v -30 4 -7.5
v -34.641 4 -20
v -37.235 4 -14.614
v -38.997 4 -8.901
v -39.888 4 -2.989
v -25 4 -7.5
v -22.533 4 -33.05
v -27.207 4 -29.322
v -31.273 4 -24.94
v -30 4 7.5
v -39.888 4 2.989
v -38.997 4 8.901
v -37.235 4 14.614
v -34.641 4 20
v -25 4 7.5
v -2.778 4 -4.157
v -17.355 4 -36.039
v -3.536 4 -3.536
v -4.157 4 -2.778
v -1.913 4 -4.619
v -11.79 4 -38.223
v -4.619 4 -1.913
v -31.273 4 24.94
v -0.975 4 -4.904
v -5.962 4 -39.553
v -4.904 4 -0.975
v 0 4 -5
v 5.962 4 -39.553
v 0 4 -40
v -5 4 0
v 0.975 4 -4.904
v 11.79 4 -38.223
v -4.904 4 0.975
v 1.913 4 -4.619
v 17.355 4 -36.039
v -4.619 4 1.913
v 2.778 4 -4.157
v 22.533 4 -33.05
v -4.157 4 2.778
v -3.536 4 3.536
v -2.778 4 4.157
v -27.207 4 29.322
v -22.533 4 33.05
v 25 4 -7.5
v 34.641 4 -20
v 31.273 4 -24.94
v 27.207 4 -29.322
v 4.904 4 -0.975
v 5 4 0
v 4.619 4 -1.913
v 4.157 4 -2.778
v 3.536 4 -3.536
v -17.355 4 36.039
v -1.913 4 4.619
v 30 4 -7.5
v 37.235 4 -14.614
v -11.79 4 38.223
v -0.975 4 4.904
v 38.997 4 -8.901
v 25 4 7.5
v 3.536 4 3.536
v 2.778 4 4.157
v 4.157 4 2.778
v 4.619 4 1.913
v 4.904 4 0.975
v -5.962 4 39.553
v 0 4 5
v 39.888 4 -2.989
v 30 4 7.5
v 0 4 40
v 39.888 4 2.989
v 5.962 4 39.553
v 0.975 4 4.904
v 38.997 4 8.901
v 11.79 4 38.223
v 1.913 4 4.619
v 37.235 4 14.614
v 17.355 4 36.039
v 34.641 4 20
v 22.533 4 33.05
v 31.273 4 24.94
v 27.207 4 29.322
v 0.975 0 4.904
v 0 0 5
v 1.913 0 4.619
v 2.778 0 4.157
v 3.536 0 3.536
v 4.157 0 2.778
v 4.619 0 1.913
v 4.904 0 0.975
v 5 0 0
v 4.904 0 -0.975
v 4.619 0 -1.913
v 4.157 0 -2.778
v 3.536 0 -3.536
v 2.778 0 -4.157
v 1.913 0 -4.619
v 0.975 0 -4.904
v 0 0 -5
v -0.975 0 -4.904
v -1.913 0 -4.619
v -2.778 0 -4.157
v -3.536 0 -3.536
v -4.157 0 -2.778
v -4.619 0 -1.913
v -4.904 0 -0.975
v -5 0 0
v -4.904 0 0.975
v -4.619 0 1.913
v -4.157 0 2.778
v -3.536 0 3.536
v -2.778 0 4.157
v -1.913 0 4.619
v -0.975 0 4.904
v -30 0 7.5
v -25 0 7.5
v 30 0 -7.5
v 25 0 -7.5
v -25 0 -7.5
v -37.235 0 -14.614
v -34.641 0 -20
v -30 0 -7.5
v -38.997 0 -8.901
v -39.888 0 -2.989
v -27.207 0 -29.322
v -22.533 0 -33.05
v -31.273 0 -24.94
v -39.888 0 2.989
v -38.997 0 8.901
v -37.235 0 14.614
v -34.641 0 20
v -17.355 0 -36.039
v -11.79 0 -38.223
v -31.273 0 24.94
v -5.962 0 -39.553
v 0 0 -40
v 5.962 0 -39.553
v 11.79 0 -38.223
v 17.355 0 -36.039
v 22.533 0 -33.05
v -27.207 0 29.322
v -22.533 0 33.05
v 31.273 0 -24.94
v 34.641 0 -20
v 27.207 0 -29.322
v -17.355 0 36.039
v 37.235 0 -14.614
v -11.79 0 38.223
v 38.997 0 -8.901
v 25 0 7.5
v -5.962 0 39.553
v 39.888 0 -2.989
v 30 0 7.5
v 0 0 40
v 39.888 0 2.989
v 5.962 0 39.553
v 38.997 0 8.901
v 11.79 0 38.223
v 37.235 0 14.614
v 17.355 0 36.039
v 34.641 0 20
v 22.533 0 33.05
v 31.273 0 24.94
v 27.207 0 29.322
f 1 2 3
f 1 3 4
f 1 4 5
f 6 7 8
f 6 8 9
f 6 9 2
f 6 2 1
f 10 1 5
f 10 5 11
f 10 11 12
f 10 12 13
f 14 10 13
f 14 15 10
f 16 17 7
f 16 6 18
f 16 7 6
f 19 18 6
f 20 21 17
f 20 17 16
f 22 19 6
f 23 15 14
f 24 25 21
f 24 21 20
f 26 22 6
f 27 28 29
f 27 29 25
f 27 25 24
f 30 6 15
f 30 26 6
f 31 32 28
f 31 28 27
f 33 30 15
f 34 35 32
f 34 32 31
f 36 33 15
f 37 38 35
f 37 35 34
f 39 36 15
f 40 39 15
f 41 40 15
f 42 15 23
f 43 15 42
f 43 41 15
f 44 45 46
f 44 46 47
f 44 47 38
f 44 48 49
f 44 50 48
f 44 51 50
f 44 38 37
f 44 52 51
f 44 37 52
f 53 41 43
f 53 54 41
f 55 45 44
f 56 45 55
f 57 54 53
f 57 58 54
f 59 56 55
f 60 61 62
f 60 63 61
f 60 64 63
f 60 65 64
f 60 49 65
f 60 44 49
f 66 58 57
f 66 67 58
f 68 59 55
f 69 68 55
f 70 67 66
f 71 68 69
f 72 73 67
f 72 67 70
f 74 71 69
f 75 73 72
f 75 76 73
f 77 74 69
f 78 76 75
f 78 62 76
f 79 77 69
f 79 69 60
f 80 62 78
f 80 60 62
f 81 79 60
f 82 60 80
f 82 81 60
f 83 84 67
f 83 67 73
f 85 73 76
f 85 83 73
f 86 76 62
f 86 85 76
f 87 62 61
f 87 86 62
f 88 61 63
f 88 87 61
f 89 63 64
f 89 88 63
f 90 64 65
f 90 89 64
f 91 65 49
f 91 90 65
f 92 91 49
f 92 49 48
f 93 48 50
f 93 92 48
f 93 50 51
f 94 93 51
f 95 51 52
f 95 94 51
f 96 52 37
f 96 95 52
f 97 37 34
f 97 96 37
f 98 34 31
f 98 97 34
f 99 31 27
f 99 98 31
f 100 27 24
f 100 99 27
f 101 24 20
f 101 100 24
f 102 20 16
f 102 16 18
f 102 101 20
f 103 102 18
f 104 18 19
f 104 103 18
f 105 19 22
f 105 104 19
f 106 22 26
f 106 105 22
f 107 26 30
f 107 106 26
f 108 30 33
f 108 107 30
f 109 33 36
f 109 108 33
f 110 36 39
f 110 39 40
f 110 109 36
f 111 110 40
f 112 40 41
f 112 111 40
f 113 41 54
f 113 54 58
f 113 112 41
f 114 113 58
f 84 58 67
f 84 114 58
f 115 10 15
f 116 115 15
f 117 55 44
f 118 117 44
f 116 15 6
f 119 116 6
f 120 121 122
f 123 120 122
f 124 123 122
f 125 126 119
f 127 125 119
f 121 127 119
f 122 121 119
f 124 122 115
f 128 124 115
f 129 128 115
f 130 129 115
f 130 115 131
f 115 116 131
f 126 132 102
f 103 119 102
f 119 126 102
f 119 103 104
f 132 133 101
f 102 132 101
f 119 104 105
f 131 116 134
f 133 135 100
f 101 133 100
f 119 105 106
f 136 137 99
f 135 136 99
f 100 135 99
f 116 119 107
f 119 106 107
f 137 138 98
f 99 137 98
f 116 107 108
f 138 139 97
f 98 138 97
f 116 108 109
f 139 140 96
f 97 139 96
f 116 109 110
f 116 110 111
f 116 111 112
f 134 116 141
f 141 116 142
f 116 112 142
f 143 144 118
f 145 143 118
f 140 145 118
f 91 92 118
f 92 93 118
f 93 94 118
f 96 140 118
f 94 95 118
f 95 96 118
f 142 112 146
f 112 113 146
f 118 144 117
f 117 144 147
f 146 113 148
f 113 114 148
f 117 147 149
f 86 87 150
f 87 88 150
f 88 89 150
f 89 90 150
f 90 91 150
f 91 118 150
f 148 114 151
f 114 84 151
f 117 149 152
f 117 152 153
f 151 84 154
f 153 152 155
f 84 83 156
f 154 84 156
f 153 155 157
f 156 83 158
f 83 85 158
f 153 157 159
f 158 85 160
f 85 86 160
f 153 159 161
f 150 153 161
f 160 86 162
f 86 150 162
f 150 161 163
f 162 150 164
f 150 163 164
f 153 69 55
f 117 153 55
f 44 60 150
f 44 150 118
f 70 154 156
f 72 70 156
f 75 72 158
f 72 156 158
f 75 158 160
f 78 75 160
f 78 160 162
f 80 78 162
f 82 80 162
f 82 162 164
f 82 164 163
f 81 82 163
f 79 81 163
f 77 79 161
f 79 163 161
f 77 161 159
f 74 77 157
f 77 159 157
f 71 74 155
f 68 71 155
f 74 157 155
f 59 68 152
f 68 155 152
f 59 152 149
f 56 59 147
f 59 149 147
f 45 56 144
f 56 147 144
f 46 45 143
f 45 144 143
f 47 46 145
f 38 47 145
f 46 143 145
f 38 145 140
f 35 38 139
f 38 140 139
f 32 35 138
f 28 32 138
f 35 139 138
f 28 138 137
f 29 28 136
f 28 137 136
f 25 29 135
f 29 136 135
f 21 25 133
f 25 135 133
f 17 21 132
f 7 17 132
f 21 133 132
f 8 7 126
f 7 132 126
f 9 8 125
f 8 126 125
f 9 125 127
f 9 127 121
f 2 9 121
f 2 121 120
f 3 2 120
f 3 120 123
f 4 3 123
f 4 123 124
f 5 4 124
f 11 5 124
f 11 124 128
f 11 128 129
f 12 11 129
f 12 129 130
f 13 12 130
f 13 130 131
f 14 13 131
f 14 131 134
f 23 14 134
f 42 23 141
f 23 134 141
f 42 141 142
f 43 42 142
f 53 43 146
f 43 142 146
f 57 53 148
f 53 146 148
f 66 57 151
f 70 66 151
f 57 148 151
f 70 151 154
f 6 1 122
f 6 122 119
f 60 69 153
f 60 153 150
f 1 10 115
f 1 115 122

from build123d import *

# Parameters (mm, degrees)
SKETCH1_R           = 40
SKETCH1_R_2         = 5
BOSS_EXTRUDE1_DEPTH = 4
SKETCH2_W           = 5
SKETCH2_H           = 15
CUT_EXTRUDE1_DEPTH  = 4


with BuildPart() as part:
    # Sketch1 → Boss-Extrude1 (new body)
    with BuildSketch(Plane(origin=(0, 0, 0), x_dir=(1, 0, 0), z_dir=(0, 1, 0))):
        with Locations(Location((0, 0, 0), (0, 0, 270))):
            Circle(SKETCH1_R)
        with Locations(Location((0, 0, 0), (0, 0, 270))):
            Circle(SKETCH1_R_2, mode=Mode.SUBTRACT)
    extrude(amount=BOSS_EXTRUDE1_DEPTH)

    # Sketch2 → Cut-Extrude1 (cut)
    with BuildSketch(Plane(origin=(0, 4, 0), x_dir=(1, 0, 0), z_dir=(0, 1, 0))):
        with Locations((-27.5, 0)):
            Rectangle(SKETCH2_W, SKETCH2_H)
    cut_extrude1 = extrude(amount=-CUT_EXTRUDE1_DEPTH, mode=Mode.SUBTRACT)

    # Mirror1: Cut-Extrude1 across plane
    add(cut_extrude1.mirror(Plane(origin=(0, 0, 0), x_dir=(0, 0, 1), z_dir=(1, 0, 0))), mode=Mode.SUBTRACT)


solid = part.part
